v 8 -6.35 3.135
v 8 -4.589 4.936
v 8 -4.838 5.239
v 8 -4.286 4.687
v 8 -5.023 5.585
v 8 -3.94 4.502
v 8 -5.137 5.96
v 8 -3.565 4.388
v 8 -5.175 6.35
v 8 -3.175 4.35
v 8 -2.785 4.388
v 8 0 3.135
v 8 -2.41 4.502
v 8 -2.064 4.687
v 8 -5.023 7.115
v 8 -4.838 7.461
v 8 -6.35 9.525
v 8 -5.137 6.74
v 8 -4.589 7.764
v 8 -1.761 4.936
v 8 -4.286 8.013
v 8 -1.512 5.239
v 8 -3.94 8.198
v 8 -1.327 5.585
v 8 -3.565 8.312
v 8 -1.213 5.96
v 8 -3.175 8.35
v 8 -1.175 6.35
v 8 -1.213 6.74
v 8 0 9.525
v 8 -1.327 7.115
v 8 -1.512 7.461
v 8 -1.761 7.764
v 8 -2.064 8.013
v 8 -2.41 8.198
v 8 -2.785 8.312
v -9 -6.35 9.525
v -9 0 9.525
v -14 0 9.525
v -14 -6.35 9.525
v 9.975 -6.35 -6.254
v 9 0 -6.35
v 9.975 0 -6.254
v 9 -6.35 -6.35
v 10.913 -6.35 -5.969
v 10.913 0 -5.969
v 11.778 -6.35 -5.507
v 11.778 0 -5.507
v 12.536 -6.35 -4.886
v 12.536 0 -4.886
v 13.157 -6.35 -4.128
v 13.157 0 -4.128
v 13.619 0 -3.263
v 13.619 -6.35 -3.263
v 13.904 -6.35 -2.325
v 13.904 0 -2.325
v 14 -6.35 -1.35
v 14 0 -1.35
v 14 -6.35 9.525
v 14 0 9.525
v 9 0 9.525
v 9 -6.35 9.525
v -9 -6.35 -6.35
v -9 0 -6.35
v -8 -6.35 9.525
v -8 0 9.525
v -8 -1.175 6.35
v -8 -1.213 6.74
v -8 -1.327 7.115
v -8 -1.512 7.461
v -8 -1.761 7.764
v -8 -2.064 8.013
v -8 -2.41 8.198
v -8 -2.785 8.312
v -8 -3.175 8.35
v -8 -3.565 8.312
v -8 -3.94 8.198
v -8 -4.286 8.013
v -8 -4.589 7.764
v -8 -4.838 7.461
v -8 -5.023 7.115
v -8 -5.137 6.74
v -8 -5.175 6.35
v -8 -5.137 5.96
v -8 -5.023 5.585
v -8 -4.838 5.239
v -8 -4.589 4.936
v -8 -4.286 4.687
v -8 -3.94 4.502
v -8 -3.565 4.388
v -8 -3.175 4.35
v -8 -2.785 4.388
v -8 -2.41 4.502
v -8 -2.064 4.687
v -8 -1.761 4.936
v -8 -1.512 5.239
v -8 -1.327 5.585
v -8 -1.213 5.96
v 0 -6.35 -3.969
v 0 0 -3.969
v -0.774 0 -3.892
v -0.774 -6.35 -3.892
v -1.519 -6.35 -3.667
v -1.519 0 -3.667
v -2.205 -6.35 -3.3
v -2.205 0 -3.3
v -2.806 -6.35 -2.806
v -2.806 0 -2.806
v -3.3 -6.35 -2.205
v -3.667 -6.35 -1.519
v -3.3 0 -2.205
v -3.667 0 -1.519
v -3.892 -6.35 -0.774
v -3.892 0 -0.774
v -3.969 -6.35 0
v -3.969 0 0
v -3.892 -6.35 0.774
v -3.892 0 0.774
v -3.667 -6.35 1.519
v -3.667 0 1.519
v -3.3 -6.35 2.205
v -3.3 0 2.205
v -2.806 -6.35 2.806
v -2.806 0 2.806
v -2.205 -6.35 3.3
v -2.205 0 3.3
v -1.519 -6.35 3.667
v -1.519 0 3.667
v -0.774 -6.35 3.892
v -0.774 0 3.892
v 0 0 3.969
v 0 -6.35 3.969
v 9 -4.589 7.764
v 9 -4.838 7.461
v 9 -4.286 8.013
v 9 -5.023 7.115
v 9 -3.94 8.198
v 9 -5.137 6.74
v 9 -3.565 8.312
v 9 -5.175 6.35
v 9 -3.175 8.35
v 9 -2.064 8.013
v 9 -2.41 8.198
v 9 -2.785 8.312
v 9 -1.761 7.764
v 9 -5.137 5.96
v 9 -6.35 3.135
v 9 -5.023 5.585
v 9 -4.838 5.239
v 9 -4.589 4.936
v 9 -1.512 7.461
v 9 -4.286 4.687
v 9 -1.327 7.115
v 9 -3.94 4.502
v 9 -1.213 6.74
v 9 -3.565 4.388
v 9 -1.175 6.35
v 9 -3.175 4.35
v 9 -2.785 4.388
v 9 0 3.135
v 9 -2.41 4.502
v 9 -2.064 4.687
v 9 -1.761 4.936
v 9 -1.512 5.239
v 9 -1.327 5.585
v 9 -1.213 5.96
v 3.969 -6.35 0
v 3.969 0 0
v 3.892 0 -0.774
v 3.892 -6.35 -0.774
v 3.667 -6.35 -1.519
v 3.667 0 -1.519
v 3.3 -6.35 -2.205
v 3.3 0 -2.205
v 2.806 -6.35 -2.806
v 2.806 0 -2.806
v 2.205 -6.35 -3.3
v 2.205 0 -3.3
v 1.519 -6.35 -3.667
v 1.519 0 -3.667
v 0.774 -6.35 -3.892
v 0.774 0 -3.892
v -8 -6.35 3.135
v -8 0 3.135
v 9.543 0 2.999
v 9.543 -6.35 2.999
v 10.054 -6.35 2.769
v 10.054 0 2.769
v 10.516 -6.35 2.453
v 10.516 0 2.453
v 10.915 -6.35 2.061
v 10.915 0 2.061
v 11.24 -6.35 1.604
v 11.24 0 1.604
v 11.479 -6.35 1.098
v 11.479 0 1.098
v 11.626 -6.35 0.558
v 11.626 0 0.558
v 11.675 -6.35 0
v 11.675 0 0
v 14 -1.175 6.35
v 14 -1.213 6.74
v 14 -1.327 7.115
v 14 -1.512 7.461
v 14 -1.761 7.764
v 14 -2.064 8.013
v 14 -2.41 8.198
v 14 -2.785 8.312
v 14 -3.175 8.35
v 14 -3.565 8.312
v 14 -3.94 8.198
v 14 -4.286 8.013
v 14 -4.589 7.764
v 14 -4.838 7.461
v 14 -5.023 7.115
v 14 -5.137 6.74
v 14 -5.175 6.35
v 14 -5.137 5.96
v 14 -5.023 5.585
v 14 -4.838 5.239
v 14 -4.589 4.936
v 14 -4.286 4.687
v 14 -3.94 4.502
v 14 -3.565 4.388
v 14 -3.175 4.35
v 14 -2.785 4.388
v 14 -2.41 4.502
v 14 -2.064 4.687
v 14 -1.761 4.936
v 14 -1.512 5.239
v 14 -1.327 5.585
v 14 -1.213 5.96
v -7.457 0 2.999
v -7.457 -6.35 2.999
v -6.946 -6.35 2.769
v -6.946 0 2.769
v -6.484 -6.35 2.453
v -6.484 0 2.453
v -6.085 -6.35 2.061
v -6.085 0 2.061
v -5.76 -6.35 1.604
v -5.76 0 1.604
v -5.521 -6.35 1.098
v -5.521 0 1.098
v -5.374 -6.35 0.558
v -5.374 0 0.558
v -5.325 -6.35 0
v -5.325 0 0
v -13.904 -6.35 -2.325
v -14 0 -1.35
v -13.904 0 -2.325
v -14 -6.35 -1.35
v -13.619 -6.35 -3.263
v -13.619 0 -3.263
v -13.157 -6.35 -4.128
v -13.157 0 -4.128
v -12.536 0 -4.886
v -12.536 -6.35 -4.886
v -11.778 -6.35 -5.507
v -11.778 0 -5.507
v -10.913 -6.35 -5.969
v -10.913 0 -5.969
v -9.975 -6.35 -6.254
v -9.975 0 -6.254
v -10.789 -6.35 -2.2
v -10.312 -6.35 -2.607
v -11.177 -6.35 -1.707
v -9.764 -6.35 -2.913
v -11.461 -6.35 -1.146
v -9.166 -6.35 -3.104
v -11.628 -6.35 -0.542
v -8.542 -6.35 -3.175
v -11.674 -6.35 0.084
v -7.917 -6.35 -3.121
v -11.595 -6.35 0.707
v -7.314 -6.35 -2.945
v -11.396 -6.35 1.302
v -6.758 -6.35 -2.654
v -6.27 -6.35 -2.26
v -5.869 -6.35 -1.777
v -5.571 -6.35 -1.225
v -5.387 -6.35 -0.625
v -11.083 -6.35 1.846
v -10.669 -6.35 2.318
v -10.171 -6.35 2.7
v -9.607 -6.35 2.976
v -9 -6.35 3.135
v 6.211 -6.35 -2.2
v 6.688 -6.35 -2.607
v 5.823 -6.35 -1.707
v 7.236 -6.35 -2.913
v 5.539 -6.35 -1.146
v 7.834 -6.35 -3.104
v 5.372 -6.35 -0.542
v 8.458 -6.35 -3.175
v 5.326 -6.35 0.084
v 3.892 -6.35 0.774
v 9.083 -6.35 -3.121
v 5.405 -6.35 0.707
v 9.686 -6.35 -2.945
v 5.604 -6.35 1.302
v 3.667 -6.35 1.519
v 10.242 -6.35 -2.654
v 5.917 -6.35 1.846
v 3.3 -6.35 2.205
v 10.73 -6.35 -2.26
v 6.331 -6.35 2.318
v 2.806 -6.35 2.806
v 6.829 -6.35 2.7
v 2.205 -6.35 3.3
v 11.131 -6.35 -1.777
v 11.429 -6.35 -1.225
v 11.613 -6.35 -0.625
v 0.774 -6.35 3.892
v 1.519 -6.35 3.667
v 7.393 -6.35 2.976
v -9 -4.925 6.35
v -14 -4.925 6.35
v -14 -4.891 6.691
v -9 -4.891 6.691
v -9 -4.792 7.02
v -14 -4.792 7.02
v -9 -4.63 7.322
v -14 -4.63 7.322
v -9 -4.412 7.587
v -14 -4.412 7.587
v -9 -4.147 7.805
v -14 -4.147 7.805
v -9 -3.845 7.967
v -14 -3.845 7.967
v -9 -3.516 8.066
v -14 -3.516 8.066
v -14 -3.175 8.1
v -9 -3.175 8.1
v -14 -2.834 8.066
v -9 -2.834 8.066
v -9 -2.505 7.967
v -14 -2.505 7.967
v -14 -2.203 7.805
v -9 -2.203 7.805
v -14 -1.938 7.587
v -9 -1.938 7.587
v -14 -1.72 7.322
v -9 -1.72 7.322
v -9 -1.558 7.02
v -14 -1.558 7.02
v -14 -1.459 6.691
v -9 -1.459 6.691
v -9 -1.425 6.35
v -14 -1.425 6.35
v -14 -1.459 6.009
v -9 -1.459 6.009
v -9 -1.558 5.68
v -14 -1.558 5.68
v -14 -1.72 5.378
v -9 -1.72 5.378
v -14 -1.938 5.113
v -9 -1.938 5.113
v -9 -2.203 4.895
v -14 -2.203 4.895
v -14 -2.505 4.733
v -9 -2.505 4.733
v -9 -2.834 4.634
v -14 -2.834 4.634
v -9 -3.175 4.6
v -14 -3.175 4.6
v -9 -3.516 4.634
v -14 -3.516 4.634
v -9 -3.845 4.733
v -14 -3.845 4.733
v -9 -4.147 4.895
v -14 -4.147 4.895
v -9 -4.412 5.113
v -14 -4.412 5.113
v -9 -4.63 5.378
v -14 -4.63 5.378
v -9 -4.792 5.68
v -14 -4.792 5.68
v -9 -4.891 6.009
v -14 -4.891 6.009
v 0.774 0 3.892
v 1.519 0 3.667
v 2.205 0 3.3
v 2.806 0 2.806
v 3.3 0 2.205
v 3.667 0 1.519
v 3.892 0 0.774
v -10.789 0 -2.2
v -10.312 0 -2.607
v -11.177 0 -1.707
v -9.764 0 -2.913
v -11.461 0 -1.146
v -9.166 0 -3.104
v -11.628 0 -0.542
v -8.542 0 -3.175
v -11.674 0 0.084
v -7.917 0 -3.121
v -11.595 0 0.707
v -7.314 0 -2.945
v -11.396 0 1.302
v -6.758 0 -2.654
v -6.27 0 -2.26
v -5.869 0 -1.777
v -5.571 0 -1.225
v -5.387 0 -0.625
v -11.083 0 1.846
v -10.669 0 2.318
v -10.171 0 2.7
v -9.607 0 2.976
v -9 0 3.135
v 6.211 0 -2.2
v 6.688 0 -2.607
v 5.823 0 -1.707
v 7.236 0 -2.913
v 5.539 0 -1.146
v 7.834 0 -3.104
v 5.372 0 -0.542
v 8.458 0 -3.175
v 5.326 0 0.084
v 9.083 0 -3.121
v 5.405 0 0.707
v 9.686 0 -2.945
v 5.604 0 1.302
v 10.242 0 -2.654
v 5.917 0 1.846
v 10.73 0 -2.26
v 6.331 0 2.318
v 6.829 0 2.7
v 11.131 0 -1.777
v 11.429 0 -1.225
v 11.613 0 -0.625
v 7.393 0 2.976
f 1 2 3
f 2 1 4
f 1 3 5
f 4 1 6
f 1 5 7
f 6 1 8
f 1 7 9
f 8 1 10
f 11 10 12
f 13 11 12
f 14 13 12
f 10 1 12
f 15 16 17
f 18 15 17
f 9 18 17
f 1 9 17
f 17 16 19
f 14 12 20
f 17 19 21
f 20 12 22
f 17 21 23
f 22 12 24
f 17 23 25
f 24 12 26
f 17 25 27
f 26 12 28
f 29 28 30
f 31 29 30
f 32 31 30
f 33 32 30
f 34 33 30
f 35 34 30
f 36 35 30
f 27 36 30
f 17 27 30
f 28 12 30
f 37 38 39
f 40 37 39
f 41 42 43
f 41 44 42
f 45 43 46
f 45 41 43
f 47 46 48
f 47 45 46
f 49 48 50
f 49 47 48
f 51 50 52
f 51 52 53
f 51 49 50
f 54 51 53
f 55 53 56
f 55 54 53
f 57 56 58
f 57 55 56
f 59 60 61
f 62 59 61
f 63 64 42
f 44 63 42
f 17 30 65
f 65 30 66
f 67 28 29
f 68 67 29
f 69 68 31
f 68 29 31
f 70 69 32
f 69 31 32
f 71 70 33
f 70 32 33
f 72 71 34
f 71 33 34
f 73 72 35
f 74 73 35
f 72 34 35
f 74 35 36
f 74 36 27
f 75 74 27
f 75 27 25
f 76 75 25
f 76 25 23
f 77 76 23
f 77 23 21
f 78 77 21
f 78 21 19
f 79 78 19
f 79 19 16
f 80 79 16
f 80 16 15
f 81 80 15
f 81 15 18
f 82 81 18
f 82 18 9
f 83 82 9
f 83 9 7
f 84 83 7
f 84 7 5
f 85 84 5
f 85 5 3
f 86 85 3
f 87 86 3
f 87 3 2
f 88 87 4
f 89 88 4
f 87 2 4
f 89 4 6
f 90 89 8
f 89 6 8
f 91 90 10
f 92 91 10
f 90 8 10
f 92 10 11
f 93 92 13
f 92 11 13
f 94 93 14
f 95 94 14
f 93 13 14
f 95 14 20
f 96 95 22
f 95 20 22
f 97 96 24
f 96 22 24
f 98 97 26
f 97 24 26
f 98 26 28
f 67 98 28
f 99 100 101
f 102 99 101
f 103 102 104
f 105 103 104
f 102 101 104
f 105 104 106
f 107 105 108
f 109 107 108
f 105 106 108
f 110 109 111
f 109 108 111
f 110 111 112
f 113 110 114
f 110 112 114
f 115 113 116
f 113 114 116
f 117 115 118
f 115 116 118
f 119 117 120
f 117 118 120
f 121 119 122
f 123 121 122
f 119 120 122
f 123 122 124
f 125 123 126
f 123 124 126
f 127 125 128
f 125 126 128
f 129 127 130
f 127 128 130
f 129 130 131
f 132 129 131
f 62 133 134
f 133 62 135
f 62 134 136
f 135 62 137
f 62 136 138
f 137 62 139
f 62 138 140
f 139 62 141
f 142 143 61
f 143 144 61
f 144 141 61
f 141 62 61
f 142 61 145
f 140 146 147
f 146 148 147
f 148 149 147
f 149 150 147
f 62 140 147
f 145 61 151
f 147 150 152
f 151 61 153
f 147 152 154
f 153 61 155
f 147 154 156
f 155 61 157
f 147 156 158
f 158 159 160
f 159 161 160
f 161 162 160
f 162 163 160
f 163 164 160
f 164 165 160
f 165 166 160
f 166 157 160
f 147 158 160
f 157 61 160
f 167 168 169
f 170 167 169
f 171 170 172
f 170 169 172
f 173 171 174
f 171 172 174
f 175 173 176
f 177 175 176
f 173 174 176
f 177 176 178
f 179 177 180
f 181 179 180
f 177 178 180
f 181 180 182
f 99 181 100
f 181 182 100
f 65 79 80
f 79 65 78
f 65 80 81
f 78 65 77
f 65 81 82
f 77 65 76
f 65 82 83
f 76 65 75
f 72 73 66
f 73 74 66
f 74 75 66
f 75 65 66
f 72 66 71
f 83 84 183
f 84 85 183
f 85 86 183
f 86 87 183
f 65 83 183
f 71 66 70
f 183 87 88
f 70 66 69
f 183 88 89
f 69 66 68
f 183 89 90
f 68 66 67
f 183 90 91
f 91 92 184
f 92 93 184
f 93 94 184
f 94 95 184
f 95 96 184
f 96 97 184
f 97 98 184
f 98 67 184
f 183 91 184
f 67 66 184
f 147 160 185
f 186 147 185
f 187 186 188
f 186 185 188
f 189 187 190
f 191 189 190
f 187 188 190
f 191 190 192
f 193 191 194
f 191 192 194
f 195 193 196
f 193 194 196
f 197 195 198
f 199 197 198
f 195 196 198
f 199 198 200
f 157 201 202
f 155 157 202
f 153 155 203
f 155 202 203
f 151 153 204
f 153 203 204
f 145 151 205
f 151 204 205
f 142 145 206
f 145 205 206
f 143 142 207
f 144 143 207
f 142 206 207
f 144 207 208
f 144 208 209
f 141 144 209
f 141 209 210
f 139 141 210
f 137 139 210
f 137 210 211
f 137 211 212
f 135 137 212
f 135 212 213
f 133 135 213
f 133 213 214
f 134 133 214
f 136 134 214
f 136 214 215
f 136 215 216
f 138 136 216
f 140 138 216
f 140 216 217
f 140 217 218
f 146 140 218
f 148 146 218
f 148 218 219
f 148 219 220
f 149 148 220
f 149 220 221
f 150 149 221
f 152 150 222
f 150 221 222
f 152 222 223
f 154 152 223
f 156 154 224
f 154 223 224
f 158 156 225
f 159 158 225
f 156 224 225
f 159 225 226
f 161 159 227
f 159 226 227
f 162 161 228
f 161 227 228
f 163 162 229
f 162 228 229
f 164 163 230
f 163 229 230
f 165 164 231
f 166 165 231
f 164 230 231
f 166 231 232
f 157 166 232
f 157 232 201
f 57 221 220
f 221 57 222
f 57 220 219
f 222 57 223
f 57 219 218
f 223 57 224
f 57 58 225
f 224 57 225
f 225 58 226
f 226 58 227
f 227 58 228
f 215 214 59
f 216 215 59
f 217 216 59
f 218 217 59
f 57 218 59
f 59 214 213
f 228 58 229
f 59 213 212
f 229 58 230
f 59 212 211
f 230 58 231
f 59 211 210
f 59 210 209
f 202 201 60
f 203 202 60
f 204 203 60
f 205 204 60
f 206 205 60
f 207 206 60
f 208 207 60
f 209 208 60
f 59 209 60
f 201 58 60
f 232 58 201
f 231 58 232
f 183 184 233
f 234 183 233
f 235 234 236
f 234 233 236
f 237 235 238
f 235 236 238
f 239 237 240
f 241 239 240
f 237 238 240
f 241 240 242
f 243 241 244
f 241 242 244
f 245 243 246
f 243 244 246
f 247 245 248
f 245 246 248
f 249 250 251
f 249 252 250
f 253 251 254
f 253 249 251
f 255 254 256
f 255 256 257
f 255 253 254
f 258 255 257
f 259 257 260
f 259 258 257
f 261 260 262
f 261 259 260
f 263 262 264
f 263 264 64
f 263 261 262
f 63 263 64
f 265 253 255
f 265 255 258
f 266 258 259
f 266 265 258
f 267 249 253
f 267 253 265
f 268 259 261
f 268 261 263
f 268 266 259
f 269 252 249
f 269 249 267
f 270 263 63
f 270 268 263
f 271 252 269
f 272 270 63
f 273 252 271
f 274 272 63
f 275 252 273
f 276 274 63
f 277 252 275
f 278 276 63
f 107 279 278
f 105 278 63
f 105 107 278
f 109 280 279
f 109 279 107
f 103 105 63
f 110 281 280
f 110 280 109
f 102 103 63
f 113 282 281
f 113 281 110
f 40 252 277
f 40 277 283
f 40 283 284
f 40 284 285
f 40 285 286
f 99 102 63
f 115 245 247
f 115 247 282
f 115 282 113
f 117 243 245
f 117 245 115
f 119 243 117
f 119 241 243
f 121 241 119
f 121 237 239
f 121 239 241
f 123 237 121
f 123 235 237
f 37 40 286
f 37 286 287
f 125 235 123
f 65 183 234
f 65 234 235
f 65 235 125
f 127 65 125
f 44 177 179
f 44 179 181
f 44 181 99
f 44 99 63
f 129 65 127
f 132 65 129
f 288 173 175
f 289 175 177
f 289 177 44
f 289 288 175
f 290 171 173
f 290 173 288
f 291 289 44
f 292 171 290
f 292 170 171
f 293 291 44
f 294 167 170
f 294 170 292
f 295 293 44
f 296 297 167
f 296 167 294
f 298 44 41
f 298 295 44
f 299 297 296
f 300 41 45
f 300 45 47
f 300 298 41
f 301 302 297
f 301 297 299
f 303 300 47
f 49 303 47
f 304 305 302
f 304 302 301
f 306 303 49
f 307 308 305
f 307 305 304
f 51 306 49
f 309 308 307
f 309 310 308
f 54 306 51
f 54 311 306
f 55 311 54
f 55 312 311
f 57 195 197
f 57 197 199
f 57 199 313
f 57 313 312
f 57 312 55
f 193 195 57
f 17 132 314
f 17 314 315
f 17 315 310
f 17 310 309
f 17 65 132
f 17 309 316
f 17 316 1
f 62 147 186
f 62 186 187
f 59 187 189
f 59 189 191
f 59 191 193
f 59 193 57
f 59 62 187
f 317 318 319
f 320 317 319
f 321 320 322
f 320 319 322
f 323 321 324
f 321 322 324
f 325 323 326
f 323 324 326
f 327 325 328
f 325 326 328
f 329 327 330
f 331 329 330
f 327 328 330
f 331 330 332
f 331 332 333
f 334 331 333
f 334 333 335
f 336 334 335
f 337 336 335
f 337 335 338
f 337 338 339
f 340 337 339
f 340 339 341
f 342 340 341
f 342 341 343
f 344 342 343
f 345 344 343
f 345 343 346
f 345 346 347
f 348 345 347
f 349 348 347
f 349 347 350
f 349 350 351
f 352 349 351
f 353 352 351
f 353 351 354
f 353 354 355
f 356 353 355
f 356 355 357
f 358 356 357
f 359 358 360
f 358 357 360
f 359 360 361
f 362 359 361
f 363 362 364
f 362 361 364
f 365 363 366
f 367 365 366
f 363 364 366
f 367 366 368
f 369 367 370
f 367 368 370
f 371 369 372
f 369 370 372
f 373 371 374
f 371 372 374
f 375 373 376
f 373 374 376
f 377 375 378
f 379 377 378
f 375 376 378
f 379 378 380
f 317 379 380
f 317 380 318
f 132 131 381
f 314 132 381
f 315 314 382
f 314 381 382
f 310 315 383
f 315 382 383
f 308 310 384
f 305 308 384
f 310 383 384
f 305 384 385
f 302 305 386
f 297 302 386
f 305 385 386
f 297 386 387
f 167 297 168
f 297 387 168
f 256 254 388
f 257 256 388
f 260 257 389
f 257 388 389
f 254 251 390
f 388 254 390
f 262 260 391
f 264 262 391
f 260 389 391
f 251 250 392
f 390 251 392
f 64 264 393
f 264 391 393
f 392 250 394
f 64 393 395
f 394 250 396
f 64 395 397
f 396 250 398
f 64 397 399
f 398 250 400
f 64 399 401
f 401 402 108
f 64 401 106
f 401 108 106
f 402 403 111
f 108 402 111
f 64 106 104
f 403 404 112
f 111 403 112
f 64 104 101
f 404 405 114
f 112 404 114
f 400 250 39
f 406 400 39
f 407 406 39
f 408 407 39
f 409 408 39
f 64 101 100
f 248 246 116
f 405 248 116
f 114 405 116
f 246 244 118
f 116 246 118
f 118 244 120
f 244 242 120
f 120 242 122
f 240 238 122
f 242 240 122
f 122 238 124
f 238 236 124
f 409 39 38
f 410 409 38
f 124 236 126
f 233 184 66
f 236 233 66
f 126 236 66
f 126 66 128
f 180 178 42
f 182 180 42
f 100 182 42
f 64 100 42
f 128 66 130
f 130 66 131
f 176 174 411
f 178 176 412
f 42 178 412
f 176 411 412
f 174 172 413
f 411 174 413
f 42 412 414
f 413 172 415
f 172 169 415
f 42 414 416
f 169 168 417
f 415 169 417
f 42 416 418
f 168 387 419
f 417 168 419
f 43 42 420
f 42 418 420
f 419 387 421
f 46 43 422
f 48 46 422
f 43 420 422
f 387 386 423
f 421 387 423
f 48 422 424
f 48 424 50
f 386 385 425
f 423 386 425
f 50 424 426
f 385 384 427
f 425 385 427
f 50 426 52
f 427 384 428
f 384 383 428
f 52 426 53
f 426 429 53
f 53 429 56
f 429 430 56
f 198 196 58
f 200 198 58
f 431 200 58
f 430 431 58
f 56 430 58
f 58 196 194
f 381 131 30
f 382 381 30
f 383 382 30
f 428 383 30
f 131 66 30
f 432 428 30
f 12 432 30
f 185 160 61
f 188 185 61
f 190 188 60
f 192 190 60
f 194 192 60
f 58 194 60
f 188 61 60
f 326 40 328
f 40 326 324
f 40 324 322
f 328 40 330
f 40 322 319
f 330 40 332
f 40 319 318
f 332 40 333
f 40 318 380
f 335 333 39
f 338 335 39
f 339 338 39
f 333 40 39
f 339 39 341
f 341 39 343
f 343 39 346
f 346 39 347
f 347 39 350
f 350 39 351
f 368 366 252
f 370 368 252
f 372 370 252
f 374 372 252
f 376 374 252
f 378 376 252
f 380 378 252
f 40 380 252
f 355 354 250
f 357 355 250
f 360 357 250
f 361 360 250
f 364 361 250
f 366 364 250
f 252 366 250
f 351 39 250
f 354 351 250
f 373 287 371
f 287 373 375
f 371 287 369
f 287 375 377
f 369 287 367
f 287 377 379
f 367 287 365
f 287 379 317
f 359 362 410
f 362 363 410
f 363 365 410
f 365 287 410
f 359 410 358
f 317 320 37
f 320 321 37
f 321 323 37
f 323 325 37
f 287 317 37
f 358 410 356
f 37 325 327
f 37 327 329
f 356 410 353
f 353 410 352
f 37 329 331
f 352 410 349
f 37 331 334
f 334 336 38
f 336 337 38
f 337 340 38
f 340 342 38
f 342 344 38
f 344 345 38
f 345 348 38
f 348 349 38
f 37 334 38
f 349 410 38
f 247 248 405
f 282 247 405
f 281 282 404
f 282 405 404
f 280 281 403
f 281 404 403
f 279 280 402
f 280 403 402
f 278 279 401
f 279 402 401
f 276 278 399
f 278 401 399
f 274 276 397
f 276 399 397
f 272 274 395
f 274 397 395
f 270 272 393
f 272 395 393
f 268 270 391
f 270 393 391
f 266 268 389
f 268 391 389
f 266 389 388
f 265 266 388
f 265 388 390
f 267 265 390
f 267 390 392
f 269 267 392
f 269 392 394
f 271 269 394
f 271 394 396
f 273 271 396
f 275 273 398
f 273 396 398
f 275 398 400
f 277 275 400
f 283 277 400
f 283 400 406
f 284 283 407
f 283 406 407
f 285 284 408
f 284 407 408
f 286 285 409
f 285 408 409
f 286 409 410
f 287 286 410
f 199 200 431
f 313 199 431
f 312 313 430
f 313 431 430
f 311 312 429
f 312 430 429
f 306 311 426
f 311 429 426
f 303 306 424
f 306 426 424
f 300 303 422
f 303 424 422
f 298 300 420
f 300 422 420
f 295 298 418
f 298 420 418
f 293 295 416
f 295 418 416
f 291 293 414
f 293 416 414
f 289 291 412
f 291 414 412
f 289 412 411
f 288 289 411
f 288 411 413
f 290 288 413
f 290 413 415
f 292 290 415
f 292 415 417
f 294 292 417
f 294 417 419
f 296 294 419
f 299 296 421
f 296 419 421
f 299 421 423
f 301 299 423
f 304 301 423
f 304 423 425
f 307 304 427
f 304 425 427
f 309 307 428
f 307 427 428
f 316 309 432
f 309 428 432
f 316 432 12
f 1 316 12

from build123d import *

# Parameters (mm, degrees)
F1_DEPTH = 6.35
F2_R     = 2
F3_DEPTH = 22.5
F4_R     = 5
F5_R     = 1.75
F6_DEPTH = 28.001


# Not quite as in the source:
# - a feature names something its author has since deleted; it is built from what else it names


with BuildPart() as f1:
    # F0 (on Front) → F1 (new body)
    with BuildSketch(Plane.XZ):
        with BuildLine():
            ThreePointArc((0, -3.96875), (-3.96875, 0), (0, 3.96875))
            Line((0, 3.96875), (0, 9.525))
            Line((0, 9.525), (-8, 9.525))
            Line((-8, 9.525), (-8, 3.1353827518))
            ThreePointArc((-8, 3.1353827518), (-6.0846195952, 2.0607189279), (-5.325, 0))
            ThreePointArc((-5.325, 0), (-10.5607189279, -2.4153804048), (-9, 3.1353827518))
            Line((-9, 3.1353827518), (-9, 9.525))
            Line((-9, 9.525), (-14, 9.525))
            Line((-14, 9.525), (-14, -6.35))
            Line((-14, -6.35), (0, -6.35))
            Line((0, -6.35), (0, -3.96875))
        make_face()
        with BuildLine():
            ThreePointArc((0, 3.96875), (2.8063300378, 2.8063300378), (3.96875, 0))
            ThreePointArc((3.96875, 0), (2.8063300378, -2.8063300378), (0, -3.96875))
            Line((0, -3.96875), (0, -6.35))
            Line((0, -6.35), (14, -6.35))
            Line((14, -6.35), (14, 9.525))
            Line((14, 9.525), (9, 9.525))
            Line((9, 9.525), (9, 3.1353827518))
            ThreePointArc((9, 3.1353827518), (10.9153804048, 2.0607189279), (11.675, 0))
            ThreePointArc((11.675, 0), (6.4392810721, -2.4153804048), (8, 3.1353827518))
            Line((8, 3.1353827518), (8, 9.525))
            Line((8, 9.525), (0, 9.525))
            Line((0, 9.525), (0, 3.96875))
        make_face()
    extrude(amount=F1_DEPTH)

    # F2 (on face) → F3 (cut)
    with BuildSketch(Plane.YZ.offset(14)):
        with Locations((-3.175, 6.35)):
            Circle(F2_R)
    extrude(amount=-F3_DEPTH, mode=Mode.SUBTRACT)

    # F4
    f4_edges = [f1.edges().sort_by_distance(p)[0] for p in [
        (14, -3.175, -6.35),
        (-14, -3.175, -6.35),
    ]]
    fillet(f4_edges, radius=F4_R)

    # F5 (on face) → F6 (cut, through all)
    with BuildSketch(Plane(origin=(-14, 0, 0), x_dir=(0, -1, 0), z_dir=(-1, 0, 0))):
        with Locations((3.175, 6.35)):
            Circle(F5_R)
    extrude(amount=-F6_DEPTH, mode=Mode.SUBTRACT)


solid = f1.part
